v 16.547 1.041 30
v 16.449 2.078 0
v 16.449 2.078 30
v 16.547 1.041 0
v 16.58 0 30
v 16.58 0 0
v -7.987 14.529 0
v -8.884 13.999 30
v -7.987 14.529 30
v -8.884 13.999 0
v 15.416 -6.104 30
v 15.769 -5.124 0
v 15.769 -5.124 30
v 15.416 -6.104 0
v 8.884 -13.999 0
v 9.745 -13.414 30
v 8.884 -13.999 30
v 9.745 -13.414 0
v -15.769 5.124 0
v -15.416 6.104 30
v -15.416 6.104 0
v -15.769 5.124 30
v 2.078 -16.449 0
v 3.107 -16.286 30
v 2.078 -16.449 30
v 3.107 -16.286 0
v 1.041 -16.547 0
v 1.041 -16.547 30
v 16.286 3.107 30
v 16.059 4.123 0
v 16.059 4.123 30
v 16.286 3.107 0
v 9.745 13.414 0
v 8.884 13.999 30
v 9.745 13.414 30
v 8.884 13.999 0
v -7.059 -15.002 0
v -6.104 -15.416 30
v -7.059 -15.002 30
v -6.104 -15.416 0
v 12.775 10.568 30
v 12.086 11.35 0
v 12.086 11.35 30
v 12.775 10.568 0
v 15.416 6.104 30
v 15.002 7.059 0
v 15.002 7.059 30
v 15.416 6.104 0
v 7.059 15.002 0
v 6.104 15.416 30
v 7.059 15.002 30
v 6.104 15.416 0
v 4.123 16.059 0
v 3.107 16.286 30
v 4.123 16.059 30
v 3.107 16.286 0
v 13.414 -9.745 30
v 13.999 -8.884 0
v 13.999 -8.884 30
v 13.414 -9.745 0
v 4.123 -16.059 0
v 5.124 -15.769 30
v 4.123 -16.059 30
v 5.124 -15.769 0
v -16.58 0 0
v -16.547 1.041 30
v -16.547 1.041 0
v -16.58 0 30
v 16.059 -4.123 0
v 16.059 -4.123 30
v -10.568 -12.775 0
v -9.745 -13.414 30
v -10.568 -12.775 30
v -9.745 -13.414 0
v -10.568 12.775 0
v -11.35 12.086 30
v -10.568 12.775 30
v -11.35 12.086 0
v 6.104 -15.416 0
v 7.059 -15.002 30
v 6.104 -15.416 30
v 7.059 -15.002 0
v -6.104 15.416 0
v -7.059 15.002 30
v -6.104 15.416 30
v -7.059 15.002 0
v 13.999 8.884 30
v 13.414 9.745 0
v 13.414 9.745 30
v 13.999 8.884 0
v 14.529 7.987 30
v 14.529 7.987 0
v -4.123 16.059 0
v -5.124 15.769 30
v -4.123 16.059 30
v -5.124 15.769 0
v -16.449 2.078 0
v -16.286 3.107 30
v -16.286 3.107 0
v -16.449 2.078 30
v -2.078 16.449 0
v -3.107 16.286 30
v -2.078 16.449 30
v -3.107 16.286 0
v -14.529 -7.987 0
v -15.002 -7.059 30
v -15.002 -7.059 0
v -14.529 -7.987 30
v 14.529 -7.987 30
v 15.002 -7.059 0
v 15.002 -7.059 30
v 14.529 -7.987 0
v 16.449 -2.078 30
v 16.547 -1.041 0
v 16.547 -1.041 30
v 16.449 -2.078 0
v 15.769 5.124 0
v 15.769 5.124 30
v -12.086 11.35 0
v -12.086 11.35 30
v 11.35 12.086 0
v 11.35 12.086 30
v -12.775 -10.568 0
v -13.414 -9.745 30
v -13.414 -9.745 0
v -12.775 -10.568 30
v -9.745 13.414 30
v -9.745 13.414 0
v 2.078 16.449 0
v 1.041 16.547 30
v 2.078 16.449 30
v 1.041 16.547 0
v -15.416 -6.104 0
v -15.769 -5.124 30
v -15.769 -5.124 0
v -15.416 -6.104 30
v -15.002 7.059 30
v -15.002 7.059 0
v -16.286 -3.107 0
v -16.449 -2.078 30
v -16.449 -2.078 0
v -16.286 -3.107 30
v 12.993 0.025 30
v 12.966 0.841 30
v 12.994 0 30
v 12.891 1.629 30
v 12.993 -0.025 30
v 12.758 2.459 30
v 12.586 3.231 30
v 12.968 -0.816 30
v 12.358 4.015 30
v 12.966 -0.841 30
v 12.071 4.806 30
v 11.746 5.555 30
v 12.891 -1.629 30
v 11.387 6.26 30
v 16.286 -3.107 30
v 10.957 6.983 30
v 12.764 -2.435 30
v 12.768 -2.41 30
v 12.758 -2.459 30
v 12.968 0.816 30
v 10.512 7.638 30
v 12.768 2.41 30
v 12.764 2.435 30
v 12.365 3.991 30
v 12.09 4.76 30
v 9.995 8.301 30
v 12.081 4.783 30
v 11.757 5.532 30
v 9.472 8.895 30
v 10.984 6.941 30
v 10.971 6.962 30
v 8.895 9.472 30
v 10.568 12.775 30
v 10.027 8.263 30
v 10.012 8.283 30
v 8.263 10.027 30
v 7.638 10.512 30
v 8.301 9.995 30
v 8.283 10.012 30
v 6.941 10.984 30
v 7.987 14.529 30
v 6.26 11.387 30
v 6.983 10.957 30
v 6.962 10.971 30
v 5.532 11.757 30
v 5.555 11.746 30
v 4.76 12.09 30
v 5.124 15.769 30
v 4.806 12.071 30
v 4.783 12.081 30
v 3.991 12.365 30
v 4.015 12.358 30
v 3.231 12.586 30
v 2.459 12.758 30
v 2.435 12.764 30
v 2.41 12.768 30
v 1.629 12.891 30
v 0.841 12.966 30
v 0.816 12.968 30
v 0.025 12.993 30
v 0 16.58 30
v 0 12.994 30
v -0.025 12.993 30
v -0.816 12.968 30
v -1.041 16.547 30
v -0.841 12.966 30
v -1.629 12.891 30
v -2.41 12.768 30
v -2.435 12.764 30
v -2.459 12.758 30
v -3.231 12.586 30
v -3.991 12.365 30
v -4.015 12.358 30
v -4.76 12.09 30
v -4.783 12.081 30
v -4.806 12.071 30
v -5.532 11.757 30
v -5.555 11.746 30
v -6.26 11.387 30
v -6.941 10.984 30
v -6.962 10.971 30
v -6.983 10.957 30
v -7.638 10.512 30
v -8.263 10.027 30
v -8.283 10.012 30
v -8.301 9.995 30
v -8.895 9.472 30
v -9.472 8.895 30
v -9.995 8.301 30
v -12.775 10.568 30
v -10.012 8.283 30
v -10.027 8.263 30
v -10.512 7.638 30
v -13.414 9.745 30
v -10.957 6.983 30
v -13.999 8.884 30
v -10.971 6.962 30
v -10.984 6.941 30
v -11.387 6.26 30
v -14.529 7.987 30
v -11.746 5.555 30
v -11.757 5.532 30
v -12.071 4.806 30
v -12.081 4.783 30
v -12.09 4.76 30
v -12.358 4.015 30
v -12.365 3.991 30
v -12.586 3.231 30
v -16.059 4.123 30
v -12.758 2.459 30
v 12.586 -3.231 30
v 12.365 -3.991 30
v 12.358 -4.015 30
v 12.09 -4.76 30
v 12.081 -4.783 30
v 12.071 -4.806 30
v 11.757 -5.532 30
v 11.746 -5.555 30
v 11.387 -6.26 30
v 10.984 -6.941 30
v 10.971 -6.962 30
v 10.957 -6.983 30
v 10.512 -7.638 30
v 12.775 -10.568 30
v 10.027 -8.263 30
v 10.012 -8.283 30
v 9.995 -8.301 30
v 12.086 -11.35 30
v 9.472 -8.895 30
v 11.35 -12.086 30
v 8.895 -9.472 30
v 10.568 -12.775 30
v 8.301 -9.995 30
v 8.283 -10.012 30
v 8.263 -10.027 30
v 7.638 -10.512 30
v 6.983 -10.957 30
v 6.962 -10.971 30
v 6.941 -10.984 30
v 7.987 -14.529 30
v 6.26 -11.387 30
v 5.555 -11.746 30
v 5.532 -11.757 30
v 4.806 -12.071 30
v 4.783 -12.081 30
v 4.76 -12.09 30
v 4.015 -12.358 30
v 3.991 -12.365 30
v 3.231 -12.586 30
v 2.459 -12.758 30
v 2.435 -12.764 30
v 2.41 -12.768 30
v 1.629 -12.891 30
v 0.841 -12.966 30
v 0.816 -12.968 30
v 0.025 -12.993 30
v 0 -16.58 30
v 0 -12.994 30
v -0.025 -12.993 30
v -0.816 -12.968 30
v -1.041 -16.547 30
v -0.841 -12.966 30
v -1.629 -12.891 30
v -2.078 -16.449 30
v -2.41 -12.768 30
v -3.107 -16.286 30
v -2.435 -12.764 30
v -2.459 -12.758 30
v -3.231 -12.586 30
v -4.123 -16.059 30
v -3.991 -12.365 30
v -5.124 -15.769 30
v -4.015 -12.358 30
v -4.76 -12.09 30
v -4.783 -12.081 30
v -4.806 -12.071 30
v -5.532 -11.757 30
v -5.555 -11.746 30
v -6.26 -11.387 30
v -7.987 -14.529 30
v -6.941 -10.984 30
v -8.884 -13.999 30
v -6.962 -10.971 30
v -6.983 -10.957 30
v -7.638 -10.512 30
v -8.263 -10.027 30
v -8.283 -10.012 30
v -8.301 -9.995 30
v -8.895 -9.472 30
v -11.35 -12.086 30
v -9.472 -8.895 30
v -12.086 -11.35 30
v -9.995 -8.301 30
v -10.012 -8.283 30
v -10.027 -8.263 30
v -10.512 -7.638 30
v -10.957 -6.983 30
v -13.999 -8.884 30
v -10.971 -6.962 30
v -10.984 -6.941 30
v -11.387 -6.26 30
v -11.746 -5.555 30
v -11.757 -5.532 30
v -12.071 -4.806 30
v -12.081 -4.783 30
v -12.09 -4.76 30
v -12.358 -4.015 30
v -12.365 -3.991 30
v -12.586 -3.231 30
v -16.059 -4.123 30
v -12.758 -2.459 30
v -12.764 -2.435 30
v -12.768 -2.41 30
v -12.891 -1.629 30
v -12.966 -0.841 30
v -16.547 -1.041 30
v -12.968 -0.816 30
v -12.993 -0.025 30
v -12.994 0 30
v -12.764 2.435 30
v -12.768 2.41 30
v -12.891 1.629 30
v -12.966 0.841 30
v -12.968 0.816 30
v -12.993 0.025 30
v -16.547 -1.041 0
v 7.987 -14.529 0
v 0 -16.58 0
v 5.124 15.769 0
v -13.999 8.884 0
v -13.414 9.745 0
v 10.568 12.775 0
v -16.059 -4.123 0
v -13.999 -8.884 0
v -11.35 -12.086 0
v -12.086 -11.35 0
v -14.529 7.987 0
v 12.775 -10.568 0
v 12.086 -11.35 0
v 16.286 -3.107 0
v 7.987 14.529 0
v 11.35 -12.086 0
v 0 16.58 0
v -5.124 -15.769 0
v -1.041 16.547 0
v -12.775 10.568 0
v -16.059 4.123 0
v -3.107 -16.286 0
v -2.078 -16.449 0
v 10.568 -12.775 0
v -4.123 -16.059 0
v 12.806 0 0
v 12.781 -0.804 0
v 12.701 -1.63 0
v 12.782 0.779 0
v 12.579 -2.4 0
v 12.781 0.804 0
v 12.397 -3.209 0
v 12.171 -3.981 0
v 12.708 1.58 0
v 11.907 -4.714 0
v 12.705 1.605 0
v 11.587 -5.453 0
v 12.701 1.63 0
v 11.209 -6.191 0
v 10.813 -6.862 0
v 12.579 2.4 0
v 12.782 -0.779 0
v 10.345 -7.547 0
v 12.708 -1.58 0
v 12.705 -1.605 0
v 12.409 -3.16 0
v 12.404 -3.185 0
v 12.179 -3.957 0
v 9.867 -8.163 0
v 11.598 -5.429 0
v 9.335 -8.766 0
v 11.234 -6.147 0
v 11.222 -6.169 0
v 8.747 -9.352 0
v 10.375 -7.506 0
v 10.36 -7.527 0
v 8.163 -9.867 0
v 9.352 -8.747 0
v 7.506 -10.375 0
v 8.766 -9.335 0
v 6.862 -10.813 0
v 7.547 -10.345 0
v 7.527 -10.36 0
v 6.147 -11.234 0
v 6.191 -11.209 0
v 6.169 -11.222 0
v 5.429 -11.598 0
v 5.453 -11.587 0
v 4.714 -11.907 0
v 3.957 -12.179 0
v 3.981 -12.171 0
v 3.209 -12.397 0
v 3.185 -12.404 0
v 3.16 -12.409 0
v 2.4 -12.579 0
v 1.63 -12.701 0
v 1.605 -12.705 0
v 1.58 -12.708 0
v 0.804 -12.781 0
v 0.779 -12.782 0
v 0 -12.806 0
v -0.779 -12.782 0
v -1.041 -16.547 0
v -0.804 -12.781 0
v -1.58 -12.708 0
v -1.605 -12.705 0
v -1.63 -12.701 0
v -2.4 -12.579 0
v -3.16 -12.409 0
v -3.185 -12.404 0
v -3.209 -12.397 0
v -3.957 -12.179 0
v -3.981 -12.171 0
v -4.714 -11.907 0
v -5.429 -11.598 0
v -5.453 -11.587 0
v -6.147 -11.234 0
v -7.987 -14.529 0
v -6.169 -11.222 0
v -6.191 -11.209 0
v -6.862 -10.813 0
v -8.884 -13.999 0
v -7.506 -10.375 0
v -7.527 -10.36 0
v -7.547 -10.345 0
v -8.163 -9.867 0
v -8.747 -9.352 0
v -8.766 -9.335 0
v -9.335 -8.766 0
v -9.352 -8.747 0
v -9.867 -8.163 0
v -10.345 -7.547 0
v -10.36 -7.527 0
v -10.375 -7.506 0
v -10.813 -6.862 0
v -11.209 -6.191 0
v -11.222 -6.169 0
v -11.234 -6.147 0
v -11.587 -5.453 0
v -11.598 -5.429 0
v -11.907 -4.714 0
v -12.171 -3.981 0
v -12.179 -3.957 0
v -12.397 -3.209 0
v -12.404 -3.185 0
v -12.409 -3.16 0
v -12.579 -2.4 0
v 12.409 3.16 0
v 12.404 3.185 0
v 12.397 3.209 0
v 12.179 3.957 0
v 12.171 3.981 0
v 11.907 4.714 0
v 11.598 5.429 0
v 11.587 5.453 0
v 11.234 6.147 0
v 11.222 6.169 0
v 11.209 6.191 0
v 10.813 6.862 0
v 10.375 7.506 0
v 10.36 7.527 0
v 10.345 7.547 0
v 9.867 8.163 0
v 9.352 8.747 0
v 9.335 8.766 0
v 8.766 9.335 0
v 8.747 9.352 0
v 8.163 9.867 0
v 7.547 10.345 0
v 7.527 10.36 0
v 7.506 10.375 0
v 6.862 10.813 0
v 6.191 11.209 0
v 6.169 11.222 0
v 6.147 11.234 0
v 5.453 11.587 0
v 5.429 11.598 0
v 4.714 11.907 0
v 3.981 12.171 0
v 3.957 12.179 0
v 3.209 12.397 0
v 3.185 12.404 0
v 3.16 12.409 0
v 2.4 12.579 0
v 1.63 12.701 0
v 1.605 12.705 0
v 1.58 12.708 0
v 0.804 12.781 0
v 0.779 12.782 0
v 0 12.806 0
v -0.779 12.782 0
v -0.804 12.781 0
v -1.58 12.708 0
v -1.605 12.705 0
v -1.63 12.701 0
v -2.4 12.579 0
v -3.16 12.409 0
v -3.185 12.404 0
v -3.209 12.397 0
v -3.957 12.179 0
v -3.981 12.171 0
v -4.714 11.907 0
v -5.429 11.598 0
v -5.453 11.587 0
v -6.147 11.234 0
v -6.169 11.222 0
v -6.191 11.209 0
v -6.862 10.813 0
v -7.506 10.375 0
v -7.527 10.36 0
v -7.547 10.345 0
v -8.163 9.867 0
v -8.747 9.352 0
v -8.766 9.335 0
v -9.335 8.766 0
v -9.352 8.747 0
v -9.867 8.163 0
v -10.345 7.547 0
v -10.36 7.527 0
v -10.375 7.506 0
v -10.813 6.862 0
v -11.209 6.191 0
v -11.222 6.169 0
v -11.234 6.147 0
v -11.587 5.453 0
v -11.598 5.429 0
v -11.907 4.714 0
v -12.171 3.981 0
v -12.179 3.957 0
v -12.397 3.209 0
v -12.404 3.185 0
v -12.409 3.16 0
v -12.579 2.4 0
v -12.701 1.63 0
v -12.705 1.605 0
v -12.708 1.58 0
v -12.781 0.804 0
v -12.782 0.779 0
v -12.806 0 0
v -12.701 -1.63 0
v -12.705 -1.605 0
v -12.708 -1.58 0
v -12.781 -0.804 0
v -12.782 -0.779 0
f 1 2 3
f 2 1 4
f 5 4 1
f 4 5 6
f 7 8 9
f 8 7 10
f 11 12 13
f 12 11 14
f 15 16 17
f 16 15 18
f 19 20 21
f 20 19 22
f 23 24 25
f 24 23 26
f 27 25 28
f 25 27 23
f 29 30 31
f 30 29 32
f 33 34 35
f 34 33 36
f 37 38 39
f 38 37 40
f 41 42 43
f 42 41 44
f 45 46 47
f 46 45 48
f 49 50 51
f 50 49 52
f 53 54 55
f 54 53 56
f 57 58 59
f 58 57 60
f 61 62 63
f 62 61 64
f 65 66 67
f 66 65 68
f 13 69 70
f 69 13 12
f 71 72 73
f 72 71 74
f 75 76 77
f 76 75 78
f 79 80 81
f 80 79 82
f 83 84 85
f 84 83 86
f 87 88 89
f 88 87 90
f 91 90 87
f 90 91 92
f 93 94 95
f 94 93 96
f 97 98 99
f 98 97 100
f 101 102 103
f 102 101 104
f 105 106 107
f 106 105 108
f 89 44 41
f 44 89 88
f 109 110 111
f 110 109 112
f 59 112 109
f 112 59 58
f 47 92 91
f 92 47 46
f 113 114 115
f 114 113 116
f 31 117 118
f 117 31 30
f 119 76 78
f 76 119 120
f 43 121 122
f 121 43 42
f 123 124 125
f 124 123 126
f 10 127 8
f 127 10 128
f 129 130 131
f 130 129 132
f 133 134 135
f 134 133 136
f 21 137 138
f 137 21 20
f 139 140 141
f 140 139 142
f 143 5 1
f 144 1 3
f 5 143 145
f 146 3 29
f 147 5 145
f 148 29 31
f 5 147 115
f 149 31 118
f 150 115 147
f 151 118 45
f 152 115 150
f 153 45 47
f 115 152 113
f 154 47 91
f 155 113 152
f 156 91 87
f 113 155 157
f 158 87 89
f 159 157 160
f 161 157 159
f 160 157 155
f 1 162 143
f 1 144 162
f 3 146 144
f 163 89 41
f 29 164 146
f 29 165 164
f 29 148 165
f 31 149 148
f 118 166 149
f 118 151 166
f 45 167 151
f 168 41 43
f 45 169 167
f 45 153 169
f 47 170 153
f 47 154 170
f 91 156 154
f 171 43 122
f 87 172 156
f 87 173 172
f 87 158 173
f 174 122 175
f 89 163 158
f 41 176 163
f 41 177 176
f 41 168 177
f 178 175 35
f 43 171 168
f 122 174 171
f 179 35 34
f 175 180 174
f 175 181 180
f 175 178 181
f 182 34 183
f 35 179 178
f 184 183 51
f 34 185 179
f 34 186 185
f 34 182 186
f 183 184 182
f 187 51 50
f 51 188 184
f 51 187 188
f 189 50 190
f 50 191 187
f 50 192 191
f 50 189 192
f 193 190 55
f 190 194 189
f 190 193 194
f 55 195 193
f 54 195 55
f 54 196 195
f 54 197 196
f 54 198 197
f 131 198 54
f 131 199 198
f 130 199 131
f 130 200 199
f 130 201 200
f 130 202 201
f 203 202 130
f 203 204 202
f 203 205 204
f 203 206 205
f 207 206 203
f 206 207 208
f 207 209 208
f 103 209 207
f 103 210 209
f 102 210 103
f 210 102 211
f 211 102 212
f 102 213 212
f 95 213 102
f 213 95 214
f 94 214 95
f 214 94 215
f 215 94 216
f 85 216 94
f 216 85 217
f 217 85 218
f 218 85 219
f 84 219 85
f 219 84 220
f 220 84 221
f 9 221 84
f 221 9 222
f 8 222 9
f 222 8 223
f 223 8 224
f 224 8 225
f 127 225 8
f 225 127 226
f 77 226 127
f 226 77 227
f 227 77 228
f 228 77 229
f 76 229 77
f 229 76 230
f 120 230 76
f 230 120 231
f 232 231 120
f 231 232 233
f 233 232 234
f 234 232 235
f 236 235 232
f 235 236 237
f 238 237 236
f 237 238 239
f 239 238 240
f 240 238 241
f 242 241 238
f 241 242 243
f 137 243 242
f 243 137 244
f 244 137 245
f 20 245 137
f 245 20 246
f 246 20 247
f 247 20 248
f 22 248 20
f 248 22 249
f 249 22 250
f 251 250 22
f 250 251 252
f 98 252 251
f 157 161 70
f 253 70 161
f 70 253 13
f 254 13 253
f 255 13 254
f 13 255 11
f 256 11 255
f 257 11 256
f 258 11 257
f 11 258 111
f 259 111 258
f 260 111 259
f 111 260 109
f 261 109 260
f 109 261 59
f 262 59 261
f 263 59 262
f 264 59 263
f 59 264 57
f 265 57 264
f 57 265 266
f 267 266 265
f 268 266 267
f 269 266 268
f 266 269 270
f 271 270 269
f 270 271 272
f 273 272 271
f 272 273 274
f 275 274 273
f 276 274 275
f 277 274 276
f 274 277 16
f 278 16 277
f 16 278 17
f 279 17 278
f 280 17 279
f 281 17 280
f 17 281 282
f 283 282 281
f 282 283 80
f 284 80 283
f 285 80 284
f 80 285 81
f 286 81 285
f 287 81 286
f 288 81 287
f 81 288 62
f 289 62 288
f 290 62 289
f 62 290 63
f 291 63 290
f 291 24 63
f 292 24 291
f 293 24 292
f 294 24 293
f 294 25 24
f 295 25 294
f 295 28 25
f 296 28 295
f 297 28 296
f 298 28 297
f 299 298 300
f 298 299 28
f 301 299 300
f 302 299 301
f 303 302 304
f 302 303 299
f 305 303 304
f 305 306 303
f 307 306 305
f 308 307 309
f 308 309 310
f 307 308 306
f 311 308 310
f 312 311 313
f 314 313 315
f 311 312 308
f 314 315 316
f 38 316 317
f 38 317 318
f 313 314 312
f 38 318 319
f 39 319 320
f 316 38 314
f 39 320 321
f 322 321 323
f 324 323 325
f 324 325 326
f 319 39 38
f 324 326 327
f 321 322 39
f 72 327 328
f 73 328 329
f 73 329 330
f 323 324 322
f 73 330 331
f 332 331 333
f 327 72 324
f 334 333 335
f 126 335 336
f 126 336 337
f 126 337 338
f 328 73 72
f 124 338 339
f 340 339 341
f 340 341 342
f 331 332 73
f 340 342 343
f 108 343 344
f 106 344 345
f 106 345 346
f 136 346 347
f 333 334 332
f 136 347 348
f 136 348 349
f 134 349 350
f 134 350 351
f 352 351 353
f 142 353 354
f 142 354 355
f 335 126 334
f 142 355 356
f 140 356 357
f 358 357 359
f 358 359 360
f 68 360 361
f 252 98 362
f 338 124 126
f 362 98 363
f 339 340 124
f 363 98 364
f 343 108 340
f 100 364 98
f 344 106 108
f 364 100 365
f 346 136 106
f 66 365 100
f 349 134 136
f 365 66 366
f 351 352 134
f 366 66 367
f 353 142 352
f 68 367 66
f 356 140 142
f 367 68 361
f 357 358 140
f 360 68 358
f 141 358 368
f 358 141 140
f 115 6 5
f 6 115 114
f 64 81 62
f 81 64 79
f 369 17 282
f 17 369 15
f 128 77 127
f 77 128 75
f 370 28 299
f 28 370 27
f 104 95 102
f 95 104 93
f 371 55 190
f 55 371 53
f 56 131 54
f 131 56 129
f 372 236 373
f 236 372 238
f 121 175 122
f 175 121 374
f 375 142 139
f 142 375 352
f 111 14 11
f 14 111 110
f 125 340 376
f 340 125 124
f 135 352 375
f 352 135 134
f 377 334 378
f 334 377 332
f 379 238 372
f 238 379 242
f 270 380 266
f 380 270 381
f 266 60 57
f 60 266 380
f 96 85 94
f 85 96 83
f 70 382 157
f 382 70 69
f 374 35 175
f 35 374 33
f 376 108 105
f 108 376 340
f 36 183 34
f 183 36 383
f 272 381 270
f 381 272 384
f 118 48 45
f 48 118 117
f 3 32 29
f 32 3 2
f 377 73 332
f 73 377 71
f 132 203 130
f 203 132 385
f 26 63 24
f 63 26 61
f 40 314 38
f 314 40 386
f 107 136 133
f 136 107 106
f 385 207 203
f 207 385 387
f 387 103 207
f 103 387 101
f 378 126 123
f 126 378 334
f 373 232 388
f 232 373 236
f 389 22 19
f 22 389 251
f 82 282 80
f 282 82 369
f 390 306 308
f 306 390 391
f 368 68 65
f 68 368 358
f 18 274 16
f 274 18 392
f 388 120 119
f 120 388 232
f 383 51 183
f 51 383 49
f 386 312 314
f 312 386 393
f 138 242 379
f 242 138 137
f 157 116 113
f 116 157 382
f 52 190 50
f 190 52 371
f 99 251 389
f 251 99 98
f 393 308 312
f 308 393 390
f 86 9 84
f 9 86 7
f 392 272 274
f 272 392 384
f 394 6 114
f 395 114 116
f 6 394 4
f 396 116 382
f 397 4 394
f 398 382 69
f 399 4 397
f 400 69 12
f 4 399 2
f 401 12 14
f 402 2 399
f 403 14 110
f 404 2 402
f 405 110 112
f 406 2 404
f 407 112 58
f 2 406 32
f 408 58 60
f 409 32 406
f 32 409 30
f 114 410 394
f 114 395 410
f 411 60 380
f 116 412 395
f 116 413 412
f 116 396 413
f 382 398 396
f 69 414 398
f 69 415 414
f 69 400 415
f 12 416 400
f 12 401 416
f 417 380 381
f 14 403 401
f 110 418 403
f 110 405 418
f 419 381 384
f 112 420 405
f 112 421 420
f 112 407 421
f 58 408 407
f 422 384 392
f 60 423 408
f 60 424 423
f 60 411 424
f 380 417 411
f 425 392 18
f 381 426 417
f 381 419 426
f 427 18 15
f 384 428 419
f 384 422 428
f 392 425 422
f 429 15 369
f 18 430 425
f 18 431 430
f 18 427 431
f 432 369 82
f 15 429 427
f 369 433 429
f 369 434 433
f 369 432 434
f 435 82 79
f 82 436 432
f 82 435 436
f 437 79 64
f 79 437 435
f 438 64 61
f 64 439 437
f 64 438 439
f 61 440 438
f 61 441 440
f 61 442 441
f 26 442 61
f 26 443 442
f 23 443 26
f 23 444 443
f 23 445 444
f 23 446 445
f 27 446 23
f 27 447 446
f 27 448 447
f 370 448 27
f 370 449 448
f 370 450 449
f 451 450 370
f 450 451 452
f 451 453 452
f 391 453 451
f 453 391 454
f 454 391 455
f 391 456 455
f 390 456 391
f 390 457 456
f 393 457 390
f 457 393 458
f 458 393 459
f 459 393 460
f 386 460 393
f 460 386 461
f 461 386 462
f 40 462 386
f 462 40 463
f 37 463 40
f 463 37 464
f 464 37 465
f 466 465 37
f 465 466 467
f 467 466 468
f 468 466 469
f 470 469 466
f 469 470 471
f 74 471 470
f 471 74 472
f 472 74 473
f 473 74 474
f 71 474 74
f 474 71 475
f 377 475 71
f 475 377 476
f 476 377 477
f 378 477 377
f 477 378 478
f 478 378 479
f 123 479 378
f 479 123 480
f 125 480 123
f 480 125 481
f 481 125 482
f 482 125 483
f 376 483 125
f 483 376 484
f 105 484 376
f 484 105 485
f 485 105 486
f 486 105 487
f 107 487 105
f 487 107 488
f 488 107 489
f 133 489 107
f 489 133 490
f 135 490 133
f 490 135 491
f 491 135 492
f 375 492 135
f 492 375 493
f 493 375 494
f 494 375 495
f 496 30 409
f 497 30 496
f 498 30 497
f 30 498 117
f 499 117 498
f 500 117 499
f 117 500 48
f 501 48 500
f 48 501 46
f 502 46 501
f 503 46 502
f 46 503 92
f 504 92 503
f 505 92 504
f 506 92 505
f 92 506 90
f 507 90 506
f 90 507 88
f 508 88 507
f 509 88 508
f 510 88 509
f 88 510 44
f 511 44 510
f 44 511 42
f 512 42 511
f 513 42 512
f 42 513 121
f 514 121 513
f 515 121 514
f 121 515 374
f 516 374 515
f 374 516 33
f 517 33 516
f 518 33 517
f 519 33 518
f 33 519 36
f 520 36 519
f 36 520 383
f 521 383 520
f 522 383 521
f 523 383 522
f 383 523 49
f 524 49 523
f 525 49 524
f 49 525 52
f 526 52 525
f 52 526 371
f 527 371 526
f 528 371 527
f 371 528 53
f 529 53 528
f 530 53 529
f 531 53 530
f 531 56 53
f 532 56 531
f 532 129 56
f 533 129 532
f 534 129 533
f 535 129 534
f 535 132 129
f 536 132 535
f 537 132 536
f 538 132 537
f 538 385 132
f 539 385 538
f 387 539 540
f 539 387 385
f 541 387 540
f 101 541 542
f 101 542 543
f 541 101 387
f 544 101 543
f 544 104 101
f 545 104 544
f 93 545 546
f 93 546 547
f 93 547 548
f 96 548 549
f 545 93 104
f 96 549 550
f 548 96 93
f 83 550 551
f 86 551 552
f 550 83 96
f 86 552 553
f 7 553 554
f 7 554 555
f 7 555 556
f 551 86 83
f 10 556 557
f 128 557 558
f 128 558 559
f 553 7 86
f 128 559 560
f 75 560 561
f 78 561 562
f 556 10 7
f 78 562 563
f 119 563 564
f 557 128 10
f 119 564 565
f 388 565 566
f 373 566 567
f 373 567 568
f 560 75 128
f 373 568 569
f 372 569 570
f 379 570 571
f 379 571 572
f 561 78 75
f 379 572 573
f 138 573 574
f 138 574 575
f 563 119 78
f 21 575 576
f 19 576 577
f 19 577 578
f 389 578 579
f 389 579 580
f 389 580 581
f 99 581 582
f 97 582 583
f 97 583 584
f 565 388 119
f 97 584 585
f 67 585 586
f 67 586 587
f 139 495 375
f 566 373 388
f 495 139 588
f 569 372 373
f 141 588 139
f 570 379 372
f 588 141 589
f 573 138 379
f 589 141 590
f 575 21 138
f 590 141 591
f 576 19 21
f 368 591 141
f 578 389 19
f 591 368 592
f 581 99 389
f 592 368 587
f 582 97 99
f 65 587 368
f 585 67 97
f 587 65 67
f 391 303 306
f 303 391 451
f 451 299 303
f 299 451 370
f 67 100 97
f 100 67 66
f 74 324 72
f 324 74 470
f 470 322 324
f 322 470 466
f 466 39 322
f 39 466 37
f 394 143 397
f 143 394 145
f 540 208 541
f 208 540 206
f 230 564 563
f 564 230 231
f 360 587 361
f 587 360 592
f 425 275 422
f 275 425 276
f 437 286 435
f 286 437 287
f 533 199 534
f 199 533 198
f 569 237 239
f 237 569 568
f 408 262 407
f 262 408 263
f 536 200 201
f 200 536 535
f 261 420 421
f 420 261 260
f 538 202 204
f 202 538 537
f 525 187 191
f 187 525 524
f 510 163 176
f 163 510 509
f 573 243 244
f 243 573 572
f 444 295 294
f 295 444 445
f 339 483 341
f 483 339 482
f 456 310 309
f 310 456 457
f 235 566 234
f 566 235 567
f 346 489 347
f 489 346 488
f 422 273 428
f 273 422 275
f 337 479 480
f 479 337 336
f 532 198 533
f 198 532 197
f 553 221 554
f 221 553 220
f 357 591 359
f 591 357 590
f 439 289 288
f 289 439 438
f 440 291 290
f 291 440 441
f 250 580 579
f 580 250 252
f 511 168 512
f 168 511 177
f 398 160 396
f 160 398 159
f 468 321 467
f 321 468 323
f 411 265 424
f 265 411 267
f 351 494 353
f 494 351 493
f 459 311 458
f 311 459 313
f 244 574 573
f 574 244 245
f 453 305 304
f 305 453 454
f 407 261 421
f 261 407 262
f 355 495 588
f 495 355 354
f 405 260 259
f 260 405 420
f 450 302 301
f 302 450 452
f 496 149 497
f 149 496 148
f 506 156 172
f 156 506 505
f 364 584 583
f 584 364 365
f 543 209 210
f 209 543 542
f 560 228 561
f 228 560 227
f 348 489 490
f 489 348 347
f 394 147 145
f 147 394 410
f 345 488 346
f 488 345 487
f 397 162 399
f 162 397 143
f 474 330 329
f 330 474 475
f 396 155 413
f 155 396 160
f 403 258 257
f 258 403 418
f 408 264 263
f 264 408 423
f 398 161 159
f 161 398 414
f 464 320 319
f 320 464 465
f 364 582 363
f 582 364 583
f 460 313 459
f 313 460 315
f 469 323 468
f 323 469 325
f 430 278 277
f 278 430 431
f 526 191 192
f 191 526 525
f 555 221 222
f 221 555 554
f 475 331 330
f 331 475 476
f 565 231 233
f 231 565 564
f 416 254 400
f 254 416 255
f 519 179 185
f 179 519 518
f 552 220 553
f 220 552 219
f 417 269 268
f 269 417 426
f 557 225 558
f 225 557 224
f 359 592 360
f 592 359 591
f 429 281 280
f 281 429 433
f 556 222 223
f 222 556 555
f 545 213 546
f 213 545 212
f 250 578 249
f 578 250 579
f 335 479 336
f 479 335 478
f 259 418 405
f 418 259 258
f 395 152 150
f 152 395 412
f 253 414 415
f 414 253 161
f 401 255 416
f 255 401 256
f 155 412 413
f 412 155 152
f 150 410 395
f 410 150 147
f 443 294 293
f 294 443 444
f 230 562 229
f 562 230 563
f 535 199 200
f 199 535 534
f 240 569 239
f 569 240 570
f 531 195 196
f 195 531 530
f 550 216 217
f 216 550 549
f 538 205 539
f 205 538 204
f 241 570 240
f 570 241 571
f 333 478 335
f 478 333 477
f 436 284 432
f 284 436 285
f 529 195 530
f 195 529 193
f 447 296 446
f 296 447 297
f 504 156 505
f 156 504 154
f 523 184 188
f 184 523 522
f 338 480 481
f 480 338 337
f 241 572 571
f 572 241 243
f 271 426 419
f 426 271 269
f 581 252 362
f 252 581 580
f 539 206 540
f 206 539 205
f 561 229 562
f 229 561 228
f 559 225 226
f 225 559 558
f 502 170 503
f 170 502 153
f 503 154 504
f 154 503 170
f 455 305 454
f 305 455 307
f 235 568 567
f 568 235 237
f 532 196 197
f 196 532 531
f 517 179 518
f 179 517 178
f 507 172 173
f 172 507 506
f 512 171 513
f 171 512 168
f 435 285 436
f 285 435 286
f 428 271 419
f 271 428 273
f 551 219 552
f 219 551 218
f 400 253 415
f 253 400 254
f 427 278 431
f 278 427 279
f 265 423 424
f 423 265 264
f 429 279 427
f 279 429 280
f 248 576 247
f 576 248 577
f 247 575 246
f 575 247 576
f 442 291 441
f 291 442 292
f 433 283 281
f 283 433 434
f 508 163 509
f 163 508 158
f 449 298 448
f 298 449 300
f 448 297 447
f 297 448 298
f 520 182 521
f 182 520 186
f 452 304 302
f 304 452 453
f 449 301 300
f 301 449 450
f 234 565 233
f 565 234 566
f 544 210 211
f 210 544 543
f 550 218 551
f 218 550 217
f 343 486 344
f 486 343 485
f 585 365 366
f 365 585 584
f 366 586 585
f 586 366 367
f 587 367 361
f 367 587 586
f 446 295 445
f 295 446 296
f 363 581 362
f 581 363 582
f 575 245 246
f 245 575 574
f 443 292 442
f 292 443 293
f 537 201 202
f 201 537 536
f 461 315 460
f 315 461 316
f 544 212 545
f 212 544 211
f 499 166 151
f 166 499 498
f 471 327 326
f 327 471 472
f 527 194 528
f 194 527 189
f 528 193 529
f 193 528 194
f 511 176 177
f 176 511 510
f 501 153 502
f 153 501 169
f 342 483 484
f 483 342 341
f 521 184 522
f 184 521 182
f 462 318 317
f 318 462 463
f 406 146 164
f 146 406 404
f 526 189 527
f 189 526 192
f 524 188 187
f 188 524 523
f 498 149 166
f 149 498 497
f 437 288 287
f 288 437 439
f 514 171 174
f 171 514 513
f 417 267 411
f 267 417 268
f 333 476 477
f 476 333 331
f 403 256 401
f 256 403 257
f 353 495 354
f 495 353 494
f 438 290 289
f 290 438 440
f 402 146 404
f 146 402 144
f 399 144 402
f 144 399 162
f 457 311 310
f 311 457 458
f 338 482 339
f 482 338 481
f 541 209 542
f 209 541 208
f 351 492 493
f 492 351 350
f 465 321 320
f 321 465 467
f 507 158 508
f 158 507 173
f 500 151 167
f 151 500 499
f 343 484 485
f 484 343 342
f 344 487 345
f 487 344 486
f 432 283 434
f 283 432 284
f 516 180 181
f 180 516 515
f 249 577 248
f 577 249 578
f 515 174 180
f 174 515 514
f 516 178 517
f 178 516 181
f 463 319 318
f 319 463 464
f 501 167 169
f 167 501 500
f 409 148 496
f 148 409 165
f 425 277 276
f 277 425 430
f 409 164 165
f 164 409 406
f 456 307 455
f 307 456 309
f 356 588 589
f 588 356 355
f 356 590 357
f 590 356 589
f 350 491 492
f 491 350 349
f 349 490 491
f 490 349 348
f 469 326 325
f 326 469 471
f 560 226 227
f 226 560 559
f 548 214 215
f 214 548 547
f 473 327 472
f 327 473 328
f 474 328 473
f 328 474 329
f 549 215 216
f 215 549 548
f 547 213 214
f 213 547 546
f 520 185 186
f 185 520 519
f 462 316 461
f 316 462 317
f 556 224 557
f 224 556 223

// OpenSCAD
//33.16 clarisea elbow
//25mm drain outter
//33.5mm outter to 19-24 (return line) 20mm deep to 2 inch sleeve

_fn=100;

difference(){
    cylinder(h=30, r1=33.16/2, r2=33.16/2, $fn=_fn);
    translate([0,00,-1]){
        color("green")
        cylinder(h=32, r1=25.6/2, r2=26/2, $fn=_fn);
    }
}
